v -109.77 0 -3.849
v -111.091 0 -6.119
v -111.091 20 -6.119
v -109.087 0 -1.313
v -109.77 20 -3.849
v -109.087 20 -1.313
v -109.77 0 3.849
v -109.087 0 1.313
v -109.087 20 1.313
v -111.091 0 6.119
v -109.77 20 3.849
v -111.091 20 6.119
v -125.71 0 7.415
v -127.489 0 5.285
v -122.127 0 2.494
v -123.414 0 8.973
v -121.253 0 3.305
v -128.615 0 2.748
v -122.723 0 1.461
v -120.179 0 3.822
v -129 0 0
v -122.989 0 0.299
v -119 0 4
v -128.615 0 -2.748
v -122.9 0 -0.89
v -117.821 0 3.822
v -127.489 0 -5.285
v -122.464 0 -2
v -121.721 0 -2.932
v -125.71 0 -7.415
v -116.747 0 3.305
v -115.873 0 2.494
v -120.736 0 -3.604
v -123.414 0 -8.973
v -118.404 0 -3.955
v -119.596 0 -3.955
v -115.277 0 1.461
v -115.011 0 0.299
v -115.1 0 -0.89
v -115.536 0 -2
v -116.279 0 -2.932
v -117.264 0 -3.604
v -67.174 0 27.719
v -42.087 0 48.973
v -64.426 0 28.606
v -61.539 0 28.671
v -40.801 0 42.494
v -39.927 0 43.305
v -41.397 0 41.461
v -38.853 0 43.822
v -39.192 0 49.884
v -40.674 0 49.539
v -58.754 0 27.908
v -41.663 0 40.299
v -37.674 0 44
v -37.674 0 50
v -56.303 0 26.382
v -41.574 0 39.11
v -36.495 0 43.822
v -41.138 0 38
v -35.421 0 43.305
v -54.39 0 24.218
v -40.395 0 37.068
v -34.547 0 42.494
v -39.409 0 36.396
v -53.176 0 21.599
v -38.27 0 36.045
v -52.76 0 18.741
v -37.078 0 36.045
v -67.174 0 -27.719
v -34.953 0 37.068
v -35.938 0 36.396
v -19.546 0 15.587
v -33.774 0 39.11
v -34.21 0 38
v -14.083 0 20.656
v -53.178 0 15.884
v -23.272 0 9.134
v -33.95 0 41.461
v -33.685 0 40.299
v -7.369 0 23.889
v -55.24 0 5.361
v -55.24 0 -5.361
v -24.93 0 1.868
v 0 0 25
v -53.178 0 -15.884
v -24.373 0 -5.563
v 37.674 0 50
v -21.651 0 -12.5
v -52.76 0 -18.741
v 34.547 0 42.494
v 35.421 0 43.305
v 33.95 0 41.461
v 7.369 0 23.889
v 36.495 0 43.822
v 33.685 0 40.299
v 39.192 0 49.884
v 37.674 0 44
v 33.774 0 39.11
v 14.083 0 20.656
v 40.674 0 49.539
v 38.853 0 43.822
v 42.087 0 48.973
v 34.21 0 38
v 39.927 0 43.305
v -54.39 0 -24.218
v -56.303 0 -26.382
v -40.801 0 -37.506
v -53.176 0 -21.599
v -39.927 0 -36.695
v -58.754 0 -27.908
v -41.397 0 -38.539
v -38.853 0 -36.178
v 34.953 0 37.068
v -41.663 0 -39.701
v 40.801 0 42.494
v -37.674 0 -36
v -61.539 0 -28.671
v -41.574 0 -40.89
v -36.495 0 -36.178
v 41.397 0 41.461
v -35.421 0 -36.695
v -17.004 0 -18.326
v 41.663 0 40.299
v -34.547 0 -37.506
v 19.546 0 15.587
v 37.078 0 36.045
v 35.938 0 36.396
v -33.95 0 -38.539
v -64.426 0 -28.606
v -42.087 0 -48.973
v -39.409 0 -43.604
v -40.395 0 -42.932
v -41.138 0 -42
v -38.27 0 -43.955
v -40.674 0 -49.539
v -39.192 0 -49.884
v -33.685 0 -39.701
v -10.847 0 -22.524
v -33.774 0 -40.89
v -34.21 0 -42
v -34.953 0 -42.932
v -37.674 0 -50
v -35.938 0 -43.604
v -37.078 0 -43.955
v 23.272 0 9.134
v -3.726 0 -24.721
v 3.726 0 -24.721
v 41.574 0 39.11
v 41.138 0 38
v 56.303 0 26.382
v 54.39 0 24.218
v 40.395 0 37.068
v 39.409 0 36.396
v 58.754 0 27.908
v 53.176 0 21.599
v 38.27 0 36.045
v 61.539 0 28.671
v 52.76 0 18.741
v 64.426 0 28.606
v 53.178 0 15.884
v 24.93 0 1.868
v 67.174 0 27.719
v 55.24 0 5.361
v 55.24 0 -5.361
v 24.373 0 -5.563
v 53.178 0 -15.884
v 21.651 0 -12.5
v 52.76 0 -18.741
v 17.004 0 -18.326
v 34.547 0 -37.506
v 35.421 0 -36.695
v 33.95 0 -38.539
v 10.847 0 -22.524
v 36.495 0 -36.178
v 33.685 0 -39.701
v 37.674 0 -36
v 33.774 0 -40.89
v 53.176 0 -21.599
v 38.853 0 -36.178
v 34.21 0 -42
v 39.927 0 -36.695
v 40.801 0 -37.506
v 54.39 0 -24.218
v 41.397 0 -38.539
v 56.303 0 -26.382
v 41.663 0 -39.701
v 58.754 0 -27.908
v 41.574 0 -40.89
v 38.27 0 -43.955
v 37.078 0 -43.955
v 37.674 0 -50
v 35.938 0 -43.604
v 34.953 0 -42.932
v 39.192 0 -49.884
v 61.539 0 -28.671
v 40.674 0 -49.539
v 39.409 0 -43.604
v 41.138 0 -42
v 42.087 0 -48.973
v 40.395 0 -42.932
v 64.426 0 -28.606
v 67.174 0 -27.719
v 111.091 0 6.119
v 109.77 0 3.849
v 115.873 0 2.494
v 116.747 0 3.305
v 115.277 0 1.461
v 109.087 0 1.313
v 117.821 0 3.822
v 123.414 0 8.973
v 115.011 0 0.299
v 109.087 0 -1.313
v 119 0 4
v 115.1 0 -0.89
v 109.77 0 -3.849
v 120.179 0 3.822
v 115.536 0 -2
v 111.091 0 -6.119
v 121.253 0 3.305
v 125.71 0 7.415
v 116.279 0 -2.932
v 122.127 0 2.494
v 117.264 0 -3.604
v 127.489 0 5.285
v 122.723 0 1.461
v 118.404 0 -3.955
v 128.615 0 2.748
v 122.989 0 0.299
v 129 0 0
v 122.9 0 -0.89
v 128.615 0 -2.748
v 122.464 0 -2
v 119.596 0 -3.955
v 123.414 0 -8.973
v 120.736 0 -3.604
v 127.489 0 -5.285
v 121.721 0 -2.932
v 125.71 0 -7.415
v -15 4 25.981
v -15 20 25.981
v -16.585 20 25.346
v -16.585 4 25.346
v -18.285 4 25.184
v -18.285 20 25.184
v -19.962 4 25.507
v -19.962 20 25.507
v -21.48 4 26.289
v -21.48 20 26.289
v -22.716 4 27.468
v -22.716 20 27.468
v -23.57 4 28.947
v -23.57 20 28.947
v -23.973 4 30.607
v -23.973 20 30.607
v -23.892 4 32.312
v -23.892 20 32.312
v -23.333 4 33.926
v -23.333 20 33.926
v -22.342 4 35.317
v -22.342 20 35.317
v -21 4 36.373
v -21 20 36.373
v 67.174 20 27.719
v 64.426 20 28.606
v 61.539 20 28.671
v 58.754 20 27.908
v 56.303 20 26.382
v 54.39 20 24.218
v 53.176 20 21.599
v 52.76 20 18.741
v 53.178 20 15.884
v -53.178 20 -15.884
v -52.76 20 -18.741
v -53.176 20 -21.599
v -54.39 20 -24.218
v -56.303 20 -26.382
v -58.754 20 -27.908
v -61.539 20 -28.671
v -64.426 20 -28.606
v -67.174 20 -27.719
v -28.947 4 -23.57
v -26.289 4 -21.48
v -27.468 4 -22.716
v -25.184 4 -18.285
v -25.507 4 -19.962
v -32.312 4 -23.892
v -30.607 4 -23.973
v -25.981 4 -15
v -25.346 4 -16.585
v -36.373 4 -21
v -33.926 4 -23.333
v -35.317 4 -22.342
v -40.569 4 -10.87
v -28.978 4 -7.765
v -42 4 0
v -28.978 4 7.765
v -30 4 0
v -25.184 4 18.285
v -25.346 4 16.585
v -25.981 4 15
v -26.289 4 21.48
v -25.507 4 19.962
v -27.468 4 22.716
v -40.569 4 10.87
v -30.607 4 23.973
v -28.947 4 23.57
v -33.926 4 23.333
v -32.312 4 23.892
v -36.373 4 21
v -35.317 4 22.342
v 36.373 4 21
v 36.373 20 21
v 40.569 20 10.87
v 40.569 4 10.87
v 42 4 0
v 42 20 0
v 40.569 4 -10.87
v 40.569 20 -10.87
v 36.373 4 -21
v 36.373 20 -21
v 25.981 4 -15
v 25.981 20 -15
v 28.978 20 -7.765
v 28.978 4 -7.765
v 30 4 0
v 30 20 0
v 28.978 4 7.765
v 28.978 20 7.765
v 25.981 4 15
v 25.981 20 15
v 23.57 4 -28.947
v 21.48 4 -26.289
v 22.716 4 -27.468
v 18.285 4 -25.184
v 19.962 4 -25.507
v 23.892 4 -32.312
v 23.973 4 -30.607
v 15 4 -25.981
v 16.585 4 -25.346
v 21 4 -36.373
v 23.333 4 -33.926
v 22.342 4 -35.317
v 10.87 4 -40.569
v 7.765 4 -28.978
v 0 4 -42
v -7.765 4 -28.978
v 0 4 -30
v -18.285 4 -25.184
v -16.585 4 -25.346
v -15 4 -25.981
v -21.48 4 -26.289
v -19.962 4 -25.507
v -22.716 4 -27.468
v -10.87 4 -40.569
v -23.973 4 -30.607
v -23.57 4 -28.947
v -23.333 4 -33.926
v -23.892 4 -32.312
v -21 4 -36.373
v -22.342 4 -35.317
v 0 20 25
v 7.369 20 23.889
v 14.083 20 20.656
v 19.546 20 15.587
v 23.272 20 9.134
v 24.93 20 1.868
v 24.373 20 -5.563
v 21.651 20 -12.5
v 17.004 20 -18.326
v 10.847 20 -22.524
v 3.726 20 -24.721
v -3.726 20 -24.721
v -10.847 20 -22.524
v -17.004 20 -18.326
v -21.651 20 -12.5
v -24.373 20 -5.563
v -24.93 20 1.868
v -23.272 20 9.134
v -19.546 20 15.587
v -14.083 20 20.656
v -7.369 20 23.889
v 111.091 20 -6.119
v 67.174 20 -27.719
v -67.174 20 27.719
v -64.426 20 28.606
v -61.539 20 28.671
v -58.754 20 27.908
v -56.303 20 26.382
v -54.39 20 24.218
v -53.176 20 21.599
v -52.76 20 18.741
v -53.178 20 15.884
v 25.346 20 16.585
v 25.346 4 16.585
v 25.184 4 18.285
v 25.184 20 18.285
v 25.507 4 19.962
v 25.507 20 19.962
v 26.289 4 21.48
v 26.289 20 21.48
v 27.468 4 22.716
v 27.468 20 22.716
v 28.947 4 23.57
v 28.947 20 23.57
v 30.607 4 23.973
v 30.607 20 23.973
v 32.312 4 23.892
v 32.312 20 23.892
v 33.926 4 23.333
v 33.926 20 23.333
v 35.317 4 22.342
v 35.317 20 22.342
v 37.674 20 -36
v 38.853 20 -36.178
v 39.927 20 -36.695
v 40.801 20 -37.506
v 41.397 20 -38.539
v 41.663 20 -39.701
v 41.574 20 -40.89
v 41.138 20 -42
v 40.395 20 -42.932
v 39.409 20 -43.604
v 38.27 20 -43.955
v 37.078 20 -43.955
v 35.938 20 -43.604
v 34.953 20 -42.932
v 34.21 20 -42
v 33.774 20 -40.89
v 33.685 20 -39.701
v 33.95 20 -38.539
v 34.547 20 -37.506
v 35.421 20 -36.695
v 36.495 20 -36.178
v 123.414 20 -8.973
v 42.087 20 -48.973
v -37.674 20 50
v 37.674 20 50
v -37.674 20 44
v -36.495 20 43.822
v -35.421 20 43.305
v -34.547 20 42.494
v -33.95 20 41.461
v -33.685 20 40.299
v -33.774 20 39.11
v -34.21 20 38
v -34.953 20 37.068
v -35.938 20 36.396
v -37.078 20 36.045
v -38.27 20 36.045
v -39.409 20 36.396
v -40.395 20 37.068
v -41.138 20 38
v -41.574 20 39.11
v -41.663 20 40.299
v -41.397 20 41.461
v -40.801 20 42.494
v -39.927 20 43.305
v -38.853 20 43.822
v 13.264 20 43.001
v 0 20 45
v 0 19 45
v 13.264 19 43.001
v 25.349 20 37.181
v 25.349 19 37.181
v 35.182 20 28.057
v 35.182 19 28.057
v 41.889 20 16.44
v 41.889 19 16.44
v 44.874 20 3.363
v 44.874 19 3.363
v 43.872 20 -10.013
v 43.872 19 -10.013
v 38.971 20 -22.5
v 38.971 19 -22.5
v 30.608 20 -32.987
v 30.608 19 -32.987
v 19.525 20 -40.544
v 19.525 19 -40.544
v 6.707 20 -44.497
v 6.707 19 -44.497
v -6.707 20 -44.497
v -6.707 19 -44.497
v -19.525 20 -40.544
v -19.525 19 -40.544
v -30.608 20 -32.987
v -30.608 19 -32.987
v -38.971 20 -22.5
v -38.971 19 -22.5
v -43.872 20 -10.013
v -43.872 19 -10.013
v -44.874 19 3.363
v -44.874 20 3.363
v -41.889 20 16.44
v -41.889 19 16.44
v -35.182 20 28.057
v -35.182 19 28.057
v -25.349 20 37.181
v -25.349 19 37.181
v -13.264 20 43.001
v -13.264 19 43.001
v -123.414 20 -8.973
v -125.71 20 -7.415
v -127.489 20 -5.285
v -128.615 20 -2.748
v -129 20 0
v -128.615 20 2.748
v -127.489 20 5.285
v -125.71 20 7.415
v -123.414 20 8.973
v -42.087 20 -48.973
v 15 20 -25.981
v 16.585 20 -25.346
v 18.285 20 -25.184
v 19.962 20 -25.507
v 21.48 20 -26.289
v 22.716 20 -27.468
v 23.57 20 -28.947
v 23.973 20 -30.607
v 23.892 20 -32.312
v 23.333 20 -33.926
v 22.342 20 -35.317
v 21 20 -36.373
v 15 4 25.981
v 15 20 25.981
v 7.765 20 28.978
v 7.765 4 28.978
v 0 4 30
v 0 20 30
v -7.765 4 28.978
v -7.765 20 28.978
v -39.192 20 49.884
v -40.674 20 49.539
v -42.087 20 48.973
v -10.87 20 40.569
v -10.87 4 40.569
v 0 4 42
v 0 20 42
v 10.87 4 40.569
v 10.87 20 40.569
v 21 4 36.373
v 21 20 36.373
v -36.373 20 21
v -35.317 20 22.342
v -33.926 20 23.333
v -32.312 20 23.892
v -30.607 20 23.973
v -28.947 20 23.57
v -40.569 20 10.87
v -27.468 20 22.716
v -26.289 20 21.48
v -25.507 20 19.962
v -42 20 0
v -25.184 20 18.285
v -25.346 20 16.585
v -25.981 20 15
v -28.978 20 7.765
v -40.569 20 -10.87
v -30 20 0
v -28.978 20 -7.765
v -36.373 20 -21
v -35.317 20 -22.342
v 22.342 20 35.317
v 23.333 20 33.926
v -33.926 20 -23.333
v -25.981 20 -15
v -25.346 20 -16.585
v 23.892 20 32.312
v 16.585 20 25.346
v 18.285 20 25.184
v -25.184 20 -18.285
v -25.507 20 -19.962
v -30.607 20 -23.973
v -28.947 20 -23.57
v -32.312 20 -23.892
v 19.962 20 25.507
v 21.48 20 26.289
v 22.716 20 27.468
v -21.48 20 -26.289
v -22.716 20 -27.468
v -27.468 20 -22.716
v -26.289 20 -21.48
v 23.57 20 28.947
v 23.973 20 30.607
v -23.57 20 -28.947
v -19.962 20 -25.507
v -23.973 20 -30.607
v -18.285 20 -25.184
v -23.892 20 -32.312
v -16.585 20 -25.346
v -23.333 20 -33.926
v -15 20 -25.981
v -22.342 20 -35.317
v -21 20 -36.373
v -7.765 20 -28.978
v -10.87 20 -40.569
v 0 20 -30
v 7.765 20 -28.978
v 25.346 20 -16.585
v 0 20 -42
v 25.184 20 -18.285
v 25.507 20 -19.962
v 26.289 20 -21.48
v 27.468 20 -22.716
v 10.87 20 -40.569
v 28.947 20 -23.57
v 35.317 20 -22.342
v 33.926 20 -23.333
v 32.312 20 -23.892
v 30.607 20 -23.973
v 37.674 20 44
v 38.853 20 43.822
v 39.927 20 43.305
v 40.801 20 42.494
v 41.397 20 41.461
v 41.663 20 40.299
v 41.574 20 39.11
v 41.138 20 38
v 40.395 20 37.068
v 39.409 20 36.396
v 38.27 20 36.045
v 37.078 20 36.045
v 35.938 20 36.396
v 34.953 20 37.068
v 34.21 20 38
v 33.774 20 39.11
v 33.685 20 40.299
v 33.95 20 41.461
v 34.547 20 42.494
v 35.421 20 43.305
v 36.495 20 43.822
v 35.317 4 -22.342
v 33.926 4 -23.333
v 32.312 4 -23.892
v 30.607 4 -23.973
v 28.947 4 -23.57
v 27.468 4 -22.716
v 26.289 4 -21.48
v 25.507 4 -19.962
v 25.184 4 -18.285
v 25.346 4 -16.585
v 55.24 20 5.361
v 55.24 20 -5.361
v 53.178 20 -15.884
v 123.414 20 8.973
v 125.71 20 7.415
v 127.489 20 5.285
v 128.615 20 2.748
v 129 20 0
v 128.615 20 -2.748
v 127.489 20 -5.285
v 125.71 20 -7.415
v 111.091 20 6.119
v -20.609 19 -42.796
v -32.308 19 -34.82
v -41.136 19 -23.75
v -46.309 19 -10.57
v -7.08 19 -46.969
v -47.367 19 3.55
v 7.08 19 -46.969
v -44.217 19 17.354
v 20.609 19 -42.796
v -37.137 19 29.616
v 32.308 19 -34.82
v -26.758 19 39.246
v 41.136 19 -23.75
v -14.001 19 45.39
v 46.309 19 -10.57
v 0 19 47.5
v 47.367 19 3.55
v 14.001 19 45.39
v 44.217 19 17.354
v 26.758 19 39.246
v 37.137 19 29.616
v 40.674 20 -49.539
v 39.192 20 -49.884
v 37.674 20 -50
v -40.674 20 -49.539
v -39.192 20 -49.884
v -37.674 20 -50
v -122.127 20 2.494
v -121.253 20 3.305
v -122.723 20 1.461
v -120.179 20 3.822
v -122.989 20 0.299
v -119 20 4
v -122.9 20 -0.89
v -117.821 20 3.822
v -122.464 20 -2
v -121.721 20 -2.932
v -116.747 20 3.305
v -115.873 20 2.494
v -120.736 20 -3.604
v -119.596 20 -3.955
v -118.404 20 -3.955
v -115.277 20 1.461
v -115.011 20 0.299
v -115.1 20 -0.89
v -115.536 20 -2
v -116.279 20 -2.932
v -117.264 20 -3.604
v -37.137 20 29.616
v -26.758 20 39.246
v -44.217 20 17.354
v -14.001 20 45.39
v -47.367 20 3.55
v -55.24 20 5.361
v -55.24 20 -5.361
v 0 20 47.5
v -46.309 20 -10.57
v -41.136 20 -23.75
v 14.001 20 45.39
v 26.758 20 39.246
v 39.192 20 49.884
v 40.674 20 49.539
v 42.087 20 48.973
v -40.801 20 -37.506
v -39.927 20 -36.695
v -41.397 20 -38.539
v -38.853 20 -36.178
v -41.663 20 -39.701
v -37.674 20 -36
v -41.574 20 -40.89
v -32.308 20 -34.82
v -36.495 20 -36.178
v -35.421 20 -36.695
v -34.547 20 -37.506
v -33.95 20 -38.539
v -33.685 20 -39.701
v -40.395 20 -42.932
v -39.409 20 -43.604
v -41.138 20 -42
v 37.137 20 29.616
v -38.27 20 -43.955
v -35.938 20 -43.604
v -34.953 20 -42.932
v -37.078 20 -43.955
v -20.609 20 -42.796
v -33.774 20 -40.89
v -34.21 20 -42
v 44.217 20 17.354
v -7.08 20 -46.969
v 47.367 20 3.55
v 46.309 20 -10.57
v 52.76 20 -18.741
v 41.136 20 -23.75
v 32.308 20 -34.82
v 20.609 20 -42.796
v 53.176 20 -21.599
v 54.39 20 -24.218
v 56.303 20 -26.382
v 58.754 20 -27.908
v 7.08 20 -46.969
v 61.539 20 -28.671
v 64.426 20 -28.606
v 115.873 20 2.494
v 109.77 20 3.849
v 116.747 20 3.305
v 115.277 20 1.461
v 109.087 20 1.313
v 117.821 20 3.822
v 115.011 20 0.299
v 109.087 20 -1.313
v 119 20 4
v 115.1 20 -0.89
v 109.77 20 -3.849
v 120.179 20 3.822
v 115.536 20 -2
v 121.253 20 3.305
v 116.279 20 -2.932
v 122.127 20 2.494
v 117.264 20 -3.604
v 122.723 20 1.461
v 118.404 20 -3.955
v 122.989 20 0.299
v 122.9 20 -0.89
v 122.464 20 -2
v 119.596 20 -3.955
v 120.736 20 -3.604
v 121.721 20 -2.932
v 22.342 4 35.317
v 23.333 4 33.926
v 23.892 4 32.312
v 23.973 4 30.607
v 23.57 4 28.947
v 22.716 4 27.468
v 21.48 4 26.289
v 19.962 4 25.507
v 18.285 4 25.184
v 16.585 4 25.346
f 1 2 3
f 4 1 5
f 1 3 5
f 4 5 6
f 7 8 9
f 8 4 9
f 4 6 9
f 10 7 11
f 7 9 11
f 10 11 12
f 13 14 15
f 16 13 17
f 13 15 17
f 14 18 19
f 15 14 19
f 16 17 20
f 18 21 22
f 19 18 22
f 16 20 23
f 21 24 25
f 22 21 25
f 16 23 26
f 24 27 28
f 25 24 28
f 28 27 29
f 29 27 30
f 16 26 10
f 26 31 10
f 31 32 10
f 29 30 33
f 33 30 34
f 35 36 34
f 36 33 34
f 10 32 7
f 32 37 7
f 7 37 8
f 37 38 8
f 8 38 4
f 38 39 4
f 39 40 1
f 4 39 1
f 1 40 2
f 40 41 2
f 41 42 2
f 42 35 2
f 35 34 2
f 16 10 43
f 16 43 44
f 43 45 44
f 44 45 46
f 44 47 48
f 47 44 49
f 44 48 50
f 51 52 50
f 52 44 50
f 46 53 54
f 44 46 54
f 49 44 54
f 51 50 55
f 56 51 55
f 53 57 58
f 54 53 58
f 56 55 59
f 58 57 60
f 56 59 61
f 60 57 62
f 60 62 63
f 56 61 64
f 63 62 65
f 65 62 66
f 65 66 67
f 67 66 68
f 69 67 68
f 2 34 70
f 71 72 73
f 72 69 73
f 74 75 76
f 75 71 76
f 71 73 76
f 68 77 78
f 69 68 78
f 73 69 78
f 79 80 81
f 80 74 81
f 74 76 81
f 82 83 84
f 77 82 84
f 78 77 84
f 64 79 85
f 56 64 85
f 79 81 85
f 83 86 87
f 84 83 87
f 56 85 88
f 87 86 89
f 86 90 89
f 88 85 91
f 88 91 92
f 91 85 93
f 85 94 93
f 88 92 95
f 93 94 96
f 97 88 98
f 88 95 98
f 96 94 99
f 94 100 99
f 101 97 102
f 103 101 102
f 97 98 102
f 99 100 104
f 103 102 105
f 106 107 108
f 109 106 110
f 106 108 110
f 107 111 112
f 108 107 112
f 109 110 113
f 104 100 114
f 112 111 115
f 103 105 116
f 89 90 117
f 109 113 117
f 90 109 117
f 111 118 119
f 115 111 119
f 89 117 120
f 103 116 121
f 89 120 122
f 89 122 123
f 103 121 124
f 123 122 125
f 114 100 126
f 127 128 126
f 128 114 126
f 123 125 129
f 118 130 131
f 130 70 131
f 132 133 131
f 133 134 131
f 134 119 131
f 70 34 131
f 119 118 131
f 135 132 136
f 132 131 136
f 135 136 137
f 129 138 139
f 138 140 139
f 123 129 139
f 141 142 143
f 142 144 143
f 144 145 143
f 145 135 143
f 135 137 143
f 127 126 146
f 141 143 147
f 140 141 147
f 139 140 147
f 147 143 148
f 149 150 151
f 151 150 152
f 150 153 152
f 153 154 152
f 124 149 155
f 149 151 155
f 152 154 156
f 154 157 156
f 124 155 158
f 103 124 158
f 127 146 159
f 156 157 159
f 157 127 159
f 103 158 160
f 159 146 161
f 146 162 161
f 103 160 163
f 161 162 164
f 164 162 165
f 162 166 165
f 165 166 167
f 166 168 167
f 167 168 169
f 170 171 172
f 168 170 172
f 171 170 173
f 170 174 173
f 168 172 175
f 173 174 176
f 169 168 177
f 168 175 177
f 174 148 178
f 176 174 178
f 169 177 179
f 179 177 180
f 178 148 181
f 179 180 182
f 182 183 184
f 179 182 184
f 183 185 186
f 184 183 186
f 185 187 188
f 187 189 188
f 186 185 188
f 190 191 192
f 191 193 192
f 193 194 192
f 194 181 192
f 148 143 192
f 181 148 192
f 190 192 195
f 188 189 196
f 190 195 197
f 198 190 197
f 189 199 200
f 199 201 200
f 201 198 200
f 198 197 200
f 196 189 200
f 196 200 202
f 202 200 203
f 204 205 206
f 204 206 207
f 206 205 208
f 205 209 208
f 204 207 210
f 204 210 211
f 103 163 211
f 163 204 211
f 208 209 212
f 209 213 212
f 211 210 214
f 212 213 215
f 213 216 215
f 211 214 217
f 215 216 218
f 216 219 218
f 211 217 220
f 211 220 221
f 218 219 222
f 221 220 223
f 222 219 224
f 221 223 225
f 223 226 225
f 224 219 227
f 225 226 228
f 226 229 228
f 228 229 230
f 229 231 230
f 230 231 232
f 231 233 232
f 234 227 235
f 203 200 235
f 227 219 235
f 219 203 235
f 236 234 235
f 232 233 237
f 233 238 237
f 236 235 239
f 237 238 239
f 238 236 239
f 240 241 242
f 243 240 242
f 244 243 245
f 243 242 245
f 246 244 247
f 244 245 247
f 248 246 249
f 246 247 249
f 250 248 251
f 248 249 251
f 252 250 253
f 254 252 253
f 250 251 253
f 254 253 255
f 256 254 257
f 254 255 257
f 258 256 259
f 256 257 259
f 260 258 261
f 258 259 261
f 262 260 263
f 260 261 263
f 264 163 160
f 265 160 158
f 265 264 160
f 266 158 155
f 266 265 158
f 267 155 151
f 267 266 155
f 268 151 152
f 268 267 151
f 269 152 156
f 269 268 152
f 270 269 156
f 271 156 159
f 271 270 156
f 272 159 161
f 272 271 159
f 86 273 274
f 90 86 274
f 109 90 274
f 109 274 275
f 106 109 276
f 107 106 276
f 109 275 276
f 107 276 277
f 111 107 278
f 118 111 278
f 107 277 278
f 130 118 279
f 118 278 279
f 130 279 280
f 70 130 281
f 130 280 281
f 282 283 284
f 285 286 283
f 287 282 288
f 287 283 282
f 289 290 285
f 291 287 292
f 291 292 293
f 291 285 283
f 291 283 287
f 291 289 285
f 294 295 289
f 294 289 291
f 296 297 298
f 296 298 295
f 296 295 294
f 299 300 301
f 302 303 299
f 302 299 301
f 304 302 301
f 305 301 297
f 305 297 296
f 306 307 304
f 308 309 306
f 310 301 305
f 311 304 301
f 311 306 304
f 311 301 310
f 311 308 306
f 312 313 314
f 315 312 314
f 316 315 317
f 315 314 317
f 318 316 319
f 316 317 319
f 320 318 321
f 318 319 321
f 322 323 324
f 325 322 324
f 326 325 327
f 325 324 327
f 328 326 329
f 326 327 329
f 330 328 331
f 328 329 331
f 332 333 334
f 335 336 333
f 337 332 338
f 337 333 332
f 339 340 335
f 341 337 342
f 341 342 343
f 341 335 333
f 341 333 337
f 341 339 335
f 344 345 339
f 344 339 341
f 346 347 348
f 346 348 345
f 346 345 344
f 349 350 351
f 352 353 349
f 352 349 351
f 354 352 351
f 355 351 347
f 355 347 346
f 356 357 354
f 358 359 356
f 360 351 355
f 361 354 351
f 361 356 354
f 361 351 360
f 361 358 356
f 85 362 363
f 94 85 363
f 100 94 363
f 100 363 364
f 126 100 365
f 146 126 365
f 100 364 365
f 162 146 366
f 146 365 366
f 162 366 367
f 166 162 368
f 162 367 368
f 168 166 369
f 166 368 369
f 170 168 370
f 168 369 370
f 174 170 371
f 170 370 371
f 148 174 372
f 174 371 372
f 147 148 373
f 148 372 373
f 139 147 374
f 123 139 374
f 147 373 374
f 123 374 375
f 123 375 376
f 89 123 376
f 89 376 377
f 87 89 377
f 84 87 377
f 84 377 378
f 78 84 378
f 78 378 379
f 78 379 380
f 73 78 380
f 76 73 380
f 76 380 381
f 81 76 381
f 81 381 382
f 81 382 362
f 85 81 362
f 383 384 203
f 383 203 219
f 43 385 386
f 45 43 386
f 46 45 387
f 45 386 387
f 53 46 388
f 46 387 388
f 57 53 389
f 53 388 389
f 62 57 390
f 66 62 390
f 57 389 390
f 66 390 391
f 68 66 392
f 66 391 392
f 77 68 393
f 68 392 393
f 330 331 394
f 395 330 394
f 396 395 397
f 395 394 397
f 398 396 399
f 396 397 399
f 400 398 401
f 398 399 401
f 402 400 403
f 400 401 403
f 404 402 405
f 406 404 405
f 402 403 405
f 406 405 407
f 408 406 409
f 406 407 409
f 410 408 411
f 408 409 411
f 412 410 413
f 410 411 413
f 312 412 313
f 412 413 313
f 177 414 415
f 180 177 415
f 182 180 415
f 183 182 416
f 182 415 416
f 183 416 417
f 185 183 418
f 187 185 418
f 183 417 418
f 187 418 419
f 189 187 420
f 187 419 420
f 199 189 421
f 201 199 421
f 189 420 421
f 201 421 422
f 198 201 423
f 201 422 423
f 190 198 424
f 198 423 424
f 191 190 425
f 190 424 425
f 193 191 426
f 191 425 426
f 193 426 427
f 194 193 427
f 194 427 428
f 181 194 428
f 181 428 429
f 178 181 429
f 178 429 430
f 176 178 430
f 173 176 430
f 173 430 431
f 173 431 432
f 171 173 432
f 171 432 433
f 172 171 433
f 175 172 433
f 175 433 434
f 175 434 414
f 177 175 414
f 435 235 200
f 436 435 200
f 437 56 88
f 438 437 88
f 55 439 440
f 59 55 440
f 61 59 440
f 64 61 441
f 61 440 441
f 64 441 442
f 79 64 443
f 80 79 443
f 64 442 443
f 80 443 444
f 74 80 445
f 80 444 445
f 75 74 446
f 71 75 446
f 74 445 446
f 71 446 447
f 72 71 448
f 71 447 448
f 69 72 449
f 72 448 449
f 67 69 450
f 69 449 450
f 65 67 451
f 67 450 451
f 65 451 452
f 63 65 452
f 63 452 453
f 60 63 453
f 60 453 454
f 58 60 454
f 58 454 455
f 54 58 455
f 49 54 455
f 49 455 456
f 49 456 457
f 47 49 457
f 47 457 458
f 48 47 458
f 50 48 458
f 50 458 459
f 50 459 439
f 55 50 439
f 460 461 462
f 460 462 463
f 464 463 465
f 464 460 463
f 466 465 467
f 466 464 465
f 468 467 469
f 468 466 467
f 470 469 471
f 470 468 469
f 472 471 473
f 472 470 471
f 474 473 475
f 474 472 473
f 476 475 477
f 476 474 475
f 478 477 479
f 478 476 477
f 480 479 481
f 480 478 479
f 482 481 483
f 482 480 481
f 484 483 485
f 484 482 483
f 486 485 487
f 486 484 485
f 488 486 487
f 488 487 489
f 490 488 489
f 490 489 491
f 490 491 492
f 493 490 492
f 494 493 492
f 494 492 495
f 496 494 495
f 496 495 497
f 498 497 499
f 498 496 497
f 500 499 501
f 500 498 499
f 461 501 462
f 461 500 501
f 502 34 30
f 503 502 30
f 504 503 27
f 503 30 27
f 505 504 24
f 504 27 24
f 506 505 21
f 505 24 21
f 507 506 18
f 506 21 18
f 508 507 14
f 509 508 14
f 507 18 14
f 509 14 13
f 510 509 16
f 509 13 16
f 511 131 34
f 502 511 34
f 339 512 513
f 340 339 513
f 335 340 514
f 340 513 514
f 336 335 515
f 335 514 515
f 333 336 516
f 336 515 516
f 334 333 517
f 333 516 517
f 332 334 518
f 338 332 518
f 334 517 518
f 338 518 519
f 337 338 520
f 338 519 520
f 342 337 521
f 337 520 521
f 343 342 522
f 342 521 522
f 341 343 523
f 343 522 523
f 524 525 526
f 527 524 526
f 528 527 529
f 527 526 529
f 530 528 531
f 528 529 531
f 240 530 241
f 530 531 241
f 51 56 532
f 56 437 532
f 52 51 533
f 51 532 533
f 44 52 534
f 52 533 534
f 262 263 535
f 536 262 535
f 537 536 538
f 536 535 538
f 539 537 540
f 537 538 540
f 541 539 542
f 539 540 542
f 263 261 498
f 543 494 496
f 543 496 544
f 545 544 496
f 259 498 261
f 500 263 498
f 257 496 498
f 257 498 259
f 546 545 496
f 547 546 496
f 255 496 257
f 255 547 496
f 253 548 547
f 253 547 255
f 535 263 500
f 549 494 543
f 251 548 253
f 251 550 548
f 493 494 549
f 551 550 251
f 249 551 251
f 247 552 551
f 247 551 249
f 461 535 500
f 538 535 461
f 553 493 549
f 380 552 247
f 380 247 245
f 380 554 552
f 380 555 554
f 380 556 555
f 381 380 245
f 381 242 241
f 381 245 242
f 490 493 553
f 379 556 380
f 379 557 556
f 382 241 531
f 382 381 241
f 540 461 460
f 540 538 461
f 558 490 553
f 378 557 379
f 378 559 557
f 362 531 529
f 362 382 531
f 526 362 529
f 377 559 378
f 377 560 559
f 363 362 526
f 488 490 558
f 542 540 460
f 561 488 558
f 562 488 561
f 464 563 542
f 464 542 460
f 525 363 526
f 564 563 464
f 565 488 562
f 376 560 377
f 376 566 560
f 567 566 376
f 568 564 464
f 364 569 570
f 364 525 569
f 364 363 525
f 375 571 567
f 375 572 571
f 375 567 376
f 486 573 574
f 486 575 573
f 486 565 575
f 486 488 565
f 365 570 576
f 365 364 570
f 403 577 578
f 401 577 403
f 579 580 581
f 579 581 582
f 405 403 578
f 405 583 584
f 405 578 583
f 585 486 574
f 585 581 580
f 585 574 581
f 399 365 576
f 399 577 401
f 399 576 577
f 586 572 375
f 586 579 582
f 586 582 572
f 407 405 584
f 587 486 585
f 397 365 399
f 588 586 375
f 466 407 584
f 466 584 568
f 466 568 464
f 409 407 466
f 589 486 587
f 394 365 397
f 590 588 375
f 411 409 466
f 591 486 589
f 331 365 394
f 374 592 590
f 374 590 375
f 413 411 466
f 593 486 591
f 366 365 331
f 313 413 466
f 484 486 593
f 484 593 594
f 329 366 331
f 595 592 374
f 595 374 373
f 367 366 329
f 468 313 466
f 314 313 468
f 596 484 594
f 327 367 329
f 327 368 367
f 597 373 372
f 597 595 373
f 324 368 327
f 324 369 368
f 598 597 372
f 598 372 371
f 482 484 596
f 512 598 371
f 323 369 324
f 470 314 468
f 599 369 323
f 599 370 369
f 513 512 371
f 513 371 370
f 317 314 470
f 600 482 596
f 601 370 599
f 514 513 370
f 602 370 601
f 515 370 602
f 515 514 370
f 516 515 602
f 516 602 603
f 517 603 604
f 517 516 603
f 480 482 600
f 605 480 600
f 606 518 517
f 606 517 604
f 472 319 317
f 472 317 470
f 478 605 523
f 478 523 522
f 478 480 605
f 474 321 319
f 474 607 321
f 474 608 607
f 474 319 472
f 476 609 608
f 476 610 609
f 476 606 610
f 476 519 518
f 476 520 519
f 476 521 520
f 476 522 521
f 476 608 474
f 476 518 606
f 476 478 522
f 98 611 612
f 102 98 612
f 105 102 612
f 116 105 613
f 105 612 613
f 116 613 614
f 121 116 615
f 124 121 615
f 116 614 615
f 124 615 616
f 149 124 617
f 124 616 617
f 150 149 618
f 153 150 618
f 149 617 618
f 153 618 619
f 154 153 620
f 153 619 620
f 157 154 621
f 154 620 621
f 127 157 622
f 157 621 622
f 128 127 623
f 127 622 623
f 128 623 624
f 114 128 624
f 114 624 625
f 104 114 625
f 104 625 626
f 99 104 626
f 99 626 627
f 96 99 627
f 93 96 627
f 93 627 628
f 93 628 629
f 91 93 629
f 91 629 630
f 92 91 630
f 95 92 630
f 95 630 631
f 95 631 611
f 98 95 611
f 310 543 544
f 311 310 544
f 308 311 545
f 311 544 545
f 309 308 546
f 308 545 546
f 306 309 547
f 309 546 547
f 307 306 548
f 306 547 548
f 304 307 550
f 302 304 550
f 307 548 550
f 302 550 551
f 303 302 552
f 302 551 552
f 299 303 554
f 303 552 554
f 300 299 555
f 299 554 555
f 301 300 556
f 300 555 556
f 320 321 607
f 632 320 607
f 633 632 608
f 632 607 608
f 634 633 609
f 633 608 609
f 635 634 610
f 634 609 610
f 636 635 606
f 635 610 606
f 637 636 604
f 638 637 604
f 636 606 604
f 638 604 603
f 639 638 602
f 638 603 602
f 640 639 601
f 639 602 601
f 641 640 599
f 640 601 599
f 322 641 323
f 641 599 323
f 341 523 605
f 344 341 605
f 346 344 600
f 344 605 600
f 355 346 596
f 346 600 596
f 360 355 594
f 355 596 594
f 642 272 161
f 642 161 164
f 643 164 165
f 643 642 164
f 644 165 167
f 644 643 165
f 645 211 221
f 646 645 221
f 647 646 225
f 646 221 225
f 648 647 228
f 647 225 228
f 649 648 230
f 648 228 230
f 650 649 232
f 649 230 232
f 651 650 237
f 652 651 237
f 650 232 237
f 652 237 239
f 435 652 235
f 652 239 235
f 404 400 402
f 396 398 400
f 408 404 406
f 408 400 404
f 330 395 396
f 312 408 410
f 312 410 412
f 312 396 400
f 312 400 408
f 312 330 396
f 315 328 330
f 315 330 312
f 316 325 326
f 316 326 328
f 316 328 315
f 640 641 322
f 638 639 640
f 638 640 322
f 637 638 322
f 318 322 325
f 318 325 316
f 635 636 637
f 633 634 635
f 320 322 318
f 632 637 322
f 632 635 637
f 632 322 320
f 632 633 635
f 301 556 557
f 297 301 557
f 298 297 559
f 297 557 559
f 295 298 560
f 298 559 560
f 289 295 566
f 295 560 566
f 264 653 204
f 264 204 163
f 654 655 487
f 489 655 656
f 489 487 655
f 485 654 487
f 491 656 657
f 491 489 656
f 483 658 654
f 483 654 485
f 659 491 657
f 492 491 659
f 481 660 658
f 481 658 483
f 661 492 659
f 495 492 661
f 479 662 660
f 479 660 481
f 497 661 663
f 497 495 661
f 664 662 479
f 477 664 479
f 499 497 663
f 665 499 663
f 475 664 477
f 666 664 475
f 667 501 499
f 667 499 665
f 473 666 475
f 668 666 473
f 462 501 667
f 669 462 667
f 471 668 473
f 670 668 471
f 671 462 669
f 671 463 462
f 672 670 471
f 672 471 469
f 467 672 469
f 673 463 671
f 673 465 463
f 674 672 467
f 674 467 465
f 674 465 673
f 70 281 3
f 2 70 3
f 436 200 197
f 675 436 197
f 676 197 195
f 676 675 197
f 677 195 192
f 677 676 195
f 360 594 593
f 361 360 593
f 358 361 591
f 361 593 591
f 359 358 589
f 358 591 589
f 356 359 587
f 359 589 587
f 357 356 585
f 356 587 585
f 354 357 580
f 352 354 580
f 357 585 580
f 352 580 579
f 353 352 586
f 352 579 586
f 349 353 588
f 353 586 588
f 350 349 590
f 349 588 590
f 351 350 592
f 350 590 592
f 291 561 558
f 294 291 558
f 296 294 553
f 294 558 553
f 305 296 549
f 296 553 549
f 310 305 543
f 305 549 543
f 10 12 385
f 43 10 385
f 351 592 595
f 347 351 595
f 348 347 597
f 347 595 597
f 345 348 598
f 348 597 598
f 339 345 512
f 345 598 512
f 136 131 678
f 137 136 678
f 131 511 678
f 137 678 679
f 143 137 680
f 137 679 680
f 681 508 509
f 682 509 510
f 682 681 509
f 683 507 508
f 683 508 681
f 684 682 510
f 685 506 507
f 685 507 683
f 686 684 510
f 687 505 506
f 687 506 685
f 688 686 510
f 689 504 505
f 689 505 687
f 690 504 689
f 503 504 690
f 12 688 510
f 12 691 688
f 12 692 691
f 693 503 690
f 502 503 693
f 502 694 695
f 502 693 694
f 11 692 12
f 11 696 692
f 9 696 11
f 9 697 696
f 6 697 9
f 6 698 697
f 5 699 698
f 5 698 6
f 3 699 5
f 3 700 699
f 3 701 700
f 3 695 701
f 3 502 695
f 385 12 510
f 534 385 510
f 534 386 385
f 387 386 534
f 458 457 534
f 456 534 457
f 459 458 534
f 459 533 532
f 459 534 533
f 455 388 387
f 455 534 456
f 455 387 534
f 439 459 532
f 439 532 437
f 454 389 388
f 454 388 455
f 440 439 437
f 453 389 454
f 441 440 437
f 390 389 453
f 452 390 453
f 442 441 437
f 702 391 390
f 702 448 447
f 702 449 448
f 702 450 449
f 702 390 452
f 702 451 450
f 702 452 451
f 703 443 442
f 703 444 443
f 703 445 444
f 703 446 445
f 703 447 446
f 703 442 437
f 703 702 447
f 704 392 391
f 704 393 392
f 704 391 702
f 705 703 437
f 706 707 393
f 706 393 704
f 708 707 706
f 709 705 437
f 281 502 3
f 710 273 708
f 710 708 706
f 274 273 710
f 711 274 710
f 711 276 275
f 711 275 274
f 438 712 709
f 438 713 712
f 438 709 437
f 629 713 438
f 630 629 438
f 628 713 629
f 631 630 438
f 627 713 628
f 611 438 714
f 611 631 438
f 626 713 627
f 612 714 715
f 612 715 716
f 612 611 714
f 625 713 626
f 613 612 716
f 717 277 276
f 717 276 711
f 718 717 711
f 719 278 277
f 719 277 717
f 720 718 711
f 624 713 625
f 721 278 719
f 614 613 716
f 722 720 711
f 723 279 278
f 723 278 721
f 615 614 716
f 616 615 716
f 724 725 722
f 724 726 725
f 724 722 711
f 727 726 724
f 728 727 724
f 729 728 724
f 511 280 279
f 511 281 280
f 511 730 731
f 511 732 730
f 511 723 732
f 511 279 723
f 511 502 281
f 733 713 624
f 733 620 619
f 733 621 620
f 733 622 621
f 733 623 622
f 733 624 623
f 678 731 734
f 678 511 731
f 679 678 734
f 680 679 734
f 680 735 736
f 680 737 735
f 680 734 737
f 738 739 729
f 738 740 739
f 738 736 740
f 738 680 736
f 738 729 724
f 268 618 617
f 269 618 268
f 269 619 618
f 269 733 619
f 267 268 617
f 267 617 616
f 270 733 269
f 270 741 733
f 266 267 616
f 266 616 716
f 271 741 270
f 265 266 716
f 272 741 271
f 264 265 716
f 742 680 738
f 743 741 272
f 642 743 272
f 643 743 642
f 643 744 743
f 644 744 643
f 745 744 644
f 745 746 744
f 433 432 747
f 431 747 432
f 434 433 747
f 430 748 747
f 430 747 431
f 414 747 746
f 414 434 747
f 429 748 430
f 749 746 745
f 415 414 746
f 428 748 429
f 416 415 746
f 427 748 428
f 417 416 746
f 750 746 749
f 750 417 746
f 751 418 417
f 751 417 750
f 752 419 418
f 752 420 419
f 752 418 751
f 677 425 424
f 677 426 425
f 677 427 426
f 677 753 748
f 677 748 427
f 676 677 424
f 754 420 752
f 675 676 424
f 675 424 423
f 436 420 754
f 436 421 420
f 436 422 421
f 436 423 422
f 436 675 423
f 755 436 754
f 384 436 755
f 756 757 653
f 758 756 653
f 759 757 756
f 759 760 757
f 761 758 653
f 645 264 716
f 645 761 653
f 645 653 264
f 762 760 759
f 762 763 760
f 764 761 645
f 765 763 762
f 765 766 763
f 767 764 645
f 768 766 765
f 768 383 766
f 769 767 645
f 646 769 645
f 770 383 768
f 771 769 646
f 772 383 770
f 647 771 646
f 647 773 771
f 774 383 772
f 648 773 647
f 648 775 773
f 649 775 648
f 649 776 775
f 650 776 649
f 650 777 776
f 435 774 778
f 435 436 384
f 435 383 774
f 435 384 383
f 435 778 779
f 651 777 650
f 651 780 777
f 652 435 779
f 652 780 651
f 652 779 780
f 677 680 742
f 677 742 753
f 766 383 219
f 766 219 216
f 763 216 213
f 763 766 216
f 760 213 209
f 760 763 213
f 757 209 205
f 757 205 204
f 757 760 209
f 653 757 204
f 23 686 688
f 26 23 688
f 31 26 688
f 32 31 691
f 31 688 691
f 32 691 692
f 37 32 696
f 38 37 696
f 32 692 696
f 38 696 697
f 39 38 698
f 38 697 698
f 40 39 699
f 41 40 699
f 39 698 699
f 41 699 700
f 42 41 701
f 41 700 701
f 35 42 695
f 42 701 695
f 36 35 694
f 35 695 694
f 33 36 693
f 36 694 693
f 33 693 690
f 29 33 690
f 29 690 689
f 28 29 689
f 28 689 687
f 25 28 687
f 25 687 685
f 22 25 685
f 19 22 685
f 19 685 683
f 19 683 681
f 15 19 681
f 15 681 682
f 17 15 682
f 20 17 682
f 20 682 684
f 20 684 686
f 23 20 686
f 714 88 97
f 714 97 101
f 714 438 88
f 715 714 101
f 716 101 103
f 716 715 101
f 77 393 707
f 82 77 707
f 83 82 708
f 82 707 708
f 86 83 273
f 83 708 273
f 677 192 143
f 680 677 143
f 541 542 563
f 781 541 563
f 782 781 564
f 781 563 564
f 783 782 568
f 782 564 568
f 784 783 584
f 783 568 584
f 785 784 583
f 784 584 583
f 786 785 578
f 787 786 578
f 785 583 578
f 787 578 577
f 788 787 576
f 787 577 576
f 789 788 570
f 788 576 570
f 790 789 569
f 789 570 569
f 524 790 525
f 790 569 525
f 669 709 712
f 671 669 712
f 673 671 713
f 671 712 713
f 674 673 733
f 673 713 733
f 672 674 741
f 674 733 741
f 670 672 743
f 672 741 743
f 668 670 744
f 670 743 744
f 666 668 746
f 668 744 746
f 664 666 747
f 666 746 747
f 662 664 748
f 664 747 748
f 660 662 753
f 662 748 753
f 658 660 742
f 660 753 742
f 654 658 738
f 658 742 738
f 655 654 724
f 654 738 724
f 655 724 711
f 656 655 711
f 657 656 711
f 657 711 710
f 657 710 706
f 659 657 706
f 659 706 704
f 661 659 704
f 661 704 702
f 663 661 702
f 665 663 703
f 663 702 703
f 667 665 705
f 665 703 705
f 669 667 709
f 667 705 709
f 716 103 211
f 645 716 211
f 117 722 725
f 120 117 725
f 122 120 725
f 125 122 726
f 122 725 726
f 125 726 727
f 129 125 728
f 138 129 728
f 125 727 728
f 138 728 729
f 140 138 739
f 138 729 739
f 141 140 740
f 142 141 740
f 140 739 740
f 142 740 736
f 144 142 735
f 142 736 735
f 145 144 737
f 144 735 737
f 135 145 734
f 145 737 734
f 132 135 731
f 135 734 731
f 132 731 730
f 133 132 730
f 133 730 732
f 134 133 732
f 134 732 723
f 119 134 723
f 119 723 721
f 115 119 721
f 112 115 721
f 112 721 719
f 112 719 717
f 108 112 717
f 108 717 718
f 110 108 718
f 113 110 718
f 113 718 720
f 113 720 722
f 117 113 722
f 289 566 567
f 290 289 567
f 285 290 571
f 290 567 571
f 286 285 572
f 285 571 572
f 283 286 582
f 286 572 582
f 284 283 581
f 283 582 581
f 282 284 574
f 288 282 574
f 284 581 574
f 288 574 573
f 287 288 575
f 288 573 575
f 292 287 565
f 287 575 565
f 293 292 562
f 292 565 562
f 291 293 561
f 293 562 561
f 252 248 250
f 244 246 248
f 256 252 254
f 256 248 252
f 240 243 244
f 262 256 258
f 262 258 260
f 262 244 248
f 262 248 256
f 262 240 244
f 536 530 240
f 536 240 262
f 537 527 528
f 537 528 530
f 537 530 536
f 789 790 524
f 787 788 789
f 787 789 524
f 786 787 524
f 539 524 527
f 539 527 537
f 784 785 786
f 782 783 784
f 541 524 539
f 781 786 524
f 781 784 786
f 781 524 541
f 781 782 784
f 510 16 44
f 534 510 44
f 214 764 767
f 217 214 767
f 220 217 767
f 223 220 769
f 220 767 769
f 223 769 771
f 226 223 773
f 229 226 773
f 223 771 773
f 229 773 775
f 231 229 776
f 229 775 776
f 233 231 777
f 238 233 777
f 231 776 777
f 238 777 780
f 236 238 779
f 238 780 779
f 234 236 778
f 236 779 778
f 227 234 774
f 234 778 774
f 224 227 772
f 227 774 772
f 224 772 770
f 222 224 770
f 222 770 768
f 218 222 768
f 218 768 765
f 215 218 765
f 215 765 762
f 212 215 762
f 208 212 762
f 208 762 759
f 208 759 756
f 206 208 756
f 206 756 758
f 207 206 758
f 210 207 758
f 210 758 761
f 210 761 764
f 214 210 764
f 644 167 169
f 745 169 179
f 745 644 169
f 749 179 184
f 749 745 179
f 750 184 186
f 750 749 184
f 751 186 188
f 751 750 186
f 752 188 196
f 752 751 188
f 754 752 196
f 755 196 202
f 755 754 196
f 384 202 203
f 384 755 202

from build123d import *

# Parameters (mm, degrees)
BOSS_EXTRUDE1_DEPTH = 20
SKETCH2_R           = 47.5
SKETCH2_R_2         = 45
CUT_EXTRUDE1_DEPTH  = 1
CUT_EXTRUDE2_DEPTH  = 16
CIRPATTERN1_COUNT   = 4
SKETCH4_R           = 25
CUT_EXTRUDE3_DEPTH  = 21
SKETCH6_R           = 4
CUT_EXTRUDE4_DEPTH  = 21
CUT_EXTRUDE5_DEPTH  = 21
FILLET1_R           = 10
SKETCH9_R           = 4
CUT_EXTRUDE6_DEPTH  = 21


with BuildPart() as part:
    # Sketch1 → Boss-Extrude1 (new body)
    with BuildSketch(Plane(origin=(0, 0, 0), x_dir=(1, 0, 0), z_dir=(0, 1, 0))):
        with BuildLine():
            Line((-40, -50), (40, -50))
            Line((40, -50), (123.413509856, -8.973345572))
            ThreePointArc((123.413509856, -8.973345572), (129, 0), (123.413509856, 8.973345572))
            Line((123.413509856, 8.973345572), (40, 50))
            Line((40, 50), (-40, 50))
            Line((-40, 50), (-123.413509856, 8.973345572))
            ThreePointArc((-123.413509856, 8.973345572), (-129, 0), (-123.413509856, -8.973345572))
            Line((-123.413509856, -8.973345572), (-40, -50))
        make_face()
    extrude(amount=BOSS_EXTRUDE1_DEPTH)

    # Sketch2 → Cut-Extrude1 (cut)
    with BuildSketch(Plane(origin=(0, 20, 0), x_dir=(1, 0, 0), z_dir=(0, 1, 0))):
        with Locations(Location((0, 0, 0), (0, 0, 270))):  # turned: the seam where the file's is
            Circle(SKETCH2_R)
        with Locations(Location((0, 0, 0), (0, 0, 270))):  # turned: the seam where the file's is
            Circle(SKETCH2_R_2, mode=Mode.SUBTRACT)
    extrude(amount=-CUT_EXTRUDE1_DEPTH, mode=Mode.SUBTRACT)

    # Sketch3 → Cut-Extrude2 (cut)
    with BuildSketch(Plane(origin=(0, 20, 0), x_dir=(1, 0, 0), z_dir=(0, 1, 0))):
        with BuildLine():
            ThreePointArc((36.373066959, -21), (42, 0), (36.373066959, 21))
            ThreePointArc((36.373066959, 21), (28.176914536, 23.196152423), (25.980762114, 15))
            ThreePointArc((25.980762114, 15), (30, 0), (25.980762114, -15))
            ThreePointArc((25.980762114, -15), (28.176914536, -23.196152423), (36.373066959, -21))
        make_face()
    cut_extrude2 = extrude(amount=-CUT_EXTRUDE2_DEPTH, mode=Mode.SUBTRACT)

    # CirPattern1: Cut-Extrude2 ×4 about axis
    cirpattern1_axis = Axis((0, 0, 0), (0, 1, 0))
    for i in range(1, CIRPATTERN1_COUNT):
        add(cut_extrude2.rotate(cirpattern1_axis, i * 360 / CIRPATTERN1_COUNT), mode=Mode.SUBTRACT)

    # Sketch4 → Cut-Extrude3 (cut, through all)
    with BuildSketch(Plane(origin=(0, 20, 0), x_dir=(1, 0, 0), z_dir=(0, 1, 0))):
        with Locations(Location((0, 0, 0), (0, 0, 270))):  # turned: the seam where the file's is
            Circle(SKETCH4_R)
    extrude(amount=-CUT_EXTRUDE3_DEPTH, mode=Mode.SUBTRACT)

    # Sketch6 → Cut-Extrude4 (cut, through all)
    with BuildSketch(Plane(origin=(0, 20, 0), x_dir=(1, 0, 0), z_dir=(0, 1, 0))):
        with Locations(Location((-119, 0, 0), (0, 0, 270))):  # turned: the seam where the file's is
            Circle(SKETCH6_R)
        with Locations(Location((119, 0, 0), (0, 0, 270))):  # turned: the seam where the file's is
            Circle(SKETCH6_R)
    extrude(amount=-CUT_EXTRUDE4_DEPTH, mode=Mode.SUBTRACT)

    # Sketch8 → Cut-Extrude5 (cut, through all)
    with BuildSketch(Plane(origin=(0, 20, 0), x_dir=(1, 0, 0), z_dir=(0, 1, 0))):
        with BuildLine():
            Line((-67.173638652, 27.719444727), (-111.090654796, 6.119007963))
            ThreePointArc((-111.090654796, 6.119007963), (-109, 0), (-111.090654796, -6.119007963))
            Line((-111.090654796, -6.119007963), (-67.173638652, -27.719444727))
            ThreePointArc((-67.173638652, -27.719444727), (-56.30285419, -26.381778867), (-53.178429743, -15.884099284))
            ThreePointArc((-53.178429743, -15.884099284), (-55.5, 0), (-53.178429743, 15.884099284))
            ThreePointArc((-53.178429743, 15.884099284), (-56.30285419, 26.381778867), (-67.173638652, 27.719444727))
        make_face()
    cut_extrude5 = extrude(amount=-CUT_EXTRUDE5_DEPTH, mode=Mode.SUBTRACT)

    # Mirror1: Cut-Extrude5 across plane
    add(cut_extrude5.mirror(Plane(origin=(0, 0, 0), x_dir=(0, 0, 1), z_dir=(1, 0, 0))), mode=Mode.SUBTRACT)

    # Fillet1
    fillet1_edges = [part.edges().sort_by_distance(p)[0] for p in [
        (40, 10, 50),
        (-40, 10, 50),
        (-40, 10, -50),
        (40, 10, -50),
    ]]
    fillet(fillet1_edges, radius=FILLET1_R)

    # Sketch9 → Cut-Extrude6 (cut, through all)
    with BuildSketch(Plane(origin=(0, 20, 0), x_dir=(1, 0, 0), z_dir=(0, 1, 0))):
        with Locations(Location((-37.673836784, 40, 0), (0, 0, 270))):  # turned: the seam where the file's is
            Circle(SKETCH9_R)
        with Locations(Location((37.673836784, 40, 0), (0, 0, 270))):  # turned: the seam where the file's is
            Circle(SKETCH9_R)
        with Locations(Location((-37.673836784, -40, 0), (0, 0, 270))):  # turned: the seam where the file's is
            Circle(SKETCH9_R)
        with Locations(Location((37.673836784, -40, 0), (0, 0, 270))):  # turned: the seam where the file's is
            Circle(SKETCH9_R)
    extrude(amount=-CUT_EXTRUDE6_DEPTH, mode=Mode.SUBTRACT)


solid = part.part
